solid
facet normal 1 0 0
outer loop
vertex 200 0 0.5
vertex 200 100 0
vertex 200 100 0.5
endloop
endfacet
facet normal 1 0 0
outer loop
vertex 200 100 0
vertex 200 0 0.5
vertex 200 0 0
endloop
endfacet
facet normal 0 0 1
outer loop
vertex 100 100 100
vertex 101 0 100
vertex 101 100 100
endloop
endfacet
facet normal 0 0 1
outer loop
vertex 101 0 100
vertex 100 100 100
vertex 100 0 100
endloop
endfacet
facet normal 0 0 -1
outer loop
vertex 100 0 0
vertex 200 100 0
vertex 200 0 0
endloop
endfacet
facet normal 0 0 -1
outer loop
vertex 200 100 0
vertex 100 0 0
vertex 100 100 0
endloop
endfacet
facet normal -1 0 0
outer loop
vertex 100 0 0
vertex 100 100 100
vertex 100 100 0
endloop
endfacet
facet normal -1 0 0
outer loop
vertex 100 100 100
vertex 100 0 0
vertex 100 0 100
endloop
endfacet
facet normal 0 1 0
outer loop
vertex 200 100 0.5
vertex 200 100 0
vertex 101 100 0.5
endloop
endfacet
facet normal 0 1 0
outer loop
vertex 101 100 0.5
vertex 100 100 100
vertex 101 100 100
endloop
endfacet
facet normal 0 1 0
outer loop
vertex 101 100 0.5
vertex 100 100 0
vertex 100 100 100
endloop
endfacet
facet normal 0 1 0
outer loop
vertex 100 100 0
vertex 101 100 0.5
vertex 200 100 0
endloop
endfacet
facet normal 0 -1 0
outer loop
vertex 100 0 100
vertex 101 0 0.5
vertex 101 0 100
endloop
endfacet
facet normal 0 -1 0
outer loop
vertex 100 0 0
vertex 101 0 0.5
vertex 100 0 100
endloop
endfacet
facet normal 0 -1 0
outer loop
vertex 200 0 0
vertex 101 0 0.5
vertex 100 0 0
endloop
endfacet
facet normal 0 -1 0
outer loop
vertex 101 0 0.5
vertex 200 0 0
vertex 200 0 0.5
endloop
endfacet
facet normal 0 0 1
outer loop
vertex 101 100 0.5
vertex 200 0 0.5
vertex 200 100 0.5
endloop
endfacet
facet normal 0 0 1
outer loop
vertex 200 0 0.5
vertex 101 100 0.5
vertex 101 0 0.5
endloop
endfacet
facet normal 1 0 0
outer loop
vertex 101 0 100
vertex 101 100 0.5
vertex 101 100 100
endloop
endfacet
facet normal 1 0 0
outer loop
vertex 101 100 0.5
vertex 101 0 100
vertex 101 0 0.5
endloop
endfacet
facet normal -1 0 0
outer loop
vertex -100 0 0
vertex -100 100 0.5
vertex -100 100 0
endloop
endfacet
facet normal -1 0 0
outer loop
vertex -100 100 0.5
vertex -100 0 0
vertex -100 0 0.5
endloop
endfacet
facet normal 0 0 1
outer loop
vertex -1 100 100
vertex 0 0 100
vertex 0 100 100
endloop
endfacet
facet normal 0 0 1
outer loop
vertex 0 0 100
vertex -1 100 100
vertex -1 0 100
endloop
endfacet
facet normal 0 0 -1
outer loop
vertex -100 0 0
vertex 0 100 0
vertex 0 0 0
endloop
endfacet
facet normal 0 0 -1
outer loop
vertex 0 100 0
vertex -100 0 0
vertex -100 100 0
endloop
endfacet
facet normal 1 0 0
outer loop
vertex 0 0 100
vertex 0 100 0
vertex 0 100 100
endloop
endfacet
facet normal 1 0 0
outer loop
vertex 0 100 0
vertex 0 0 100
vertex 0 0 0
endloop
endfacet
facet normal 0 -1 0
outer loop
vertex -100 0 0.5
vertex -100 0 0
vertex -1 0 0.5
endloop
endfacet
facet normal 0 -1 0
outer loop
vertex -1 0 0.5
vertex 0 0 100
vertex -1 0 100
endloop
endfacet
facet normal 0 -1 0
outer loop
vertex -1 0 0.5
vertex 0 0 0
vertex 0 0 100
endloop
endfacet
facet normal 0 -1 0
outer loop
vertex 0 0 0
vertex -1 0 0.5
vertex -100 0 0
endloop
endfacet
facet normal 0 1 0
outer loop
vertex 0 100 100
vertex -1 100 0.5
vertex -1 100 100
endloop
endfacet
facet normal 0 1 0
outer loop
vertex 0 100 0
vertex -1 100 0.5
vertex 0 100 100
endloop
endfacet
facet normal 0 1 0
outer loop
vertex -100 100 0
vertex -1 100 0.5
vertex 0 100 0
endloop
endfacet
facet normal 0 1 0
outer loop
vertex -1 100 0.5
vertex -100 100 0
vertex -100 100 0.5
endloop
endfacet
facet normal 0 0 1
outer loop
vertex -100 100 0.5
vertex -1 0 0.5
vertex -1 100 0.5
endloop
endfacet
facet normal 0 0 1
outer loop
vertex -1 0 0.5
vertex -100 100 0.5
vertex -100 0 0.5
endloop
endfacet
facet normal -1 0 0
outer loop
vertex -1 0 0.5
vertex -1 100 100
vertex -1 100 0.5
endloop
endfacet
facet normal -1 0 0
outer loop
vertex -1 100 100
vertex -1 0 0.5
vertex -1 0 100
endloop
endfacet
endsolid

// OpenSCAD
$fn = 12;


//lenght
l = 100;     
//width
w = 100;        
//height
h = 100;

module toto() {
}

ep_bord = 2;
ep_fon = 0.5;



translate([l,0,0])
    right(l,w,h,0);

translate([0,w,0])
    rotate([0,0,180])
        left(l,w,h,0);




module right (length,width,height) {
    
    difference() {
        cube([length,width,height]);
        translate([ep_bord/2,0,ep_fon])
        cube([width+5,length-ep_bord+5,height - ep_fon]);
    }
    
    
}

module left (length,width,height) {
    
        difference() {
        cube([length,width,height]);
        translate([ep_bord/2,0,ep_fon])
        cube([width+5,length-ep_bord+5,height - ep_fon]);
    }
    
    
}








































